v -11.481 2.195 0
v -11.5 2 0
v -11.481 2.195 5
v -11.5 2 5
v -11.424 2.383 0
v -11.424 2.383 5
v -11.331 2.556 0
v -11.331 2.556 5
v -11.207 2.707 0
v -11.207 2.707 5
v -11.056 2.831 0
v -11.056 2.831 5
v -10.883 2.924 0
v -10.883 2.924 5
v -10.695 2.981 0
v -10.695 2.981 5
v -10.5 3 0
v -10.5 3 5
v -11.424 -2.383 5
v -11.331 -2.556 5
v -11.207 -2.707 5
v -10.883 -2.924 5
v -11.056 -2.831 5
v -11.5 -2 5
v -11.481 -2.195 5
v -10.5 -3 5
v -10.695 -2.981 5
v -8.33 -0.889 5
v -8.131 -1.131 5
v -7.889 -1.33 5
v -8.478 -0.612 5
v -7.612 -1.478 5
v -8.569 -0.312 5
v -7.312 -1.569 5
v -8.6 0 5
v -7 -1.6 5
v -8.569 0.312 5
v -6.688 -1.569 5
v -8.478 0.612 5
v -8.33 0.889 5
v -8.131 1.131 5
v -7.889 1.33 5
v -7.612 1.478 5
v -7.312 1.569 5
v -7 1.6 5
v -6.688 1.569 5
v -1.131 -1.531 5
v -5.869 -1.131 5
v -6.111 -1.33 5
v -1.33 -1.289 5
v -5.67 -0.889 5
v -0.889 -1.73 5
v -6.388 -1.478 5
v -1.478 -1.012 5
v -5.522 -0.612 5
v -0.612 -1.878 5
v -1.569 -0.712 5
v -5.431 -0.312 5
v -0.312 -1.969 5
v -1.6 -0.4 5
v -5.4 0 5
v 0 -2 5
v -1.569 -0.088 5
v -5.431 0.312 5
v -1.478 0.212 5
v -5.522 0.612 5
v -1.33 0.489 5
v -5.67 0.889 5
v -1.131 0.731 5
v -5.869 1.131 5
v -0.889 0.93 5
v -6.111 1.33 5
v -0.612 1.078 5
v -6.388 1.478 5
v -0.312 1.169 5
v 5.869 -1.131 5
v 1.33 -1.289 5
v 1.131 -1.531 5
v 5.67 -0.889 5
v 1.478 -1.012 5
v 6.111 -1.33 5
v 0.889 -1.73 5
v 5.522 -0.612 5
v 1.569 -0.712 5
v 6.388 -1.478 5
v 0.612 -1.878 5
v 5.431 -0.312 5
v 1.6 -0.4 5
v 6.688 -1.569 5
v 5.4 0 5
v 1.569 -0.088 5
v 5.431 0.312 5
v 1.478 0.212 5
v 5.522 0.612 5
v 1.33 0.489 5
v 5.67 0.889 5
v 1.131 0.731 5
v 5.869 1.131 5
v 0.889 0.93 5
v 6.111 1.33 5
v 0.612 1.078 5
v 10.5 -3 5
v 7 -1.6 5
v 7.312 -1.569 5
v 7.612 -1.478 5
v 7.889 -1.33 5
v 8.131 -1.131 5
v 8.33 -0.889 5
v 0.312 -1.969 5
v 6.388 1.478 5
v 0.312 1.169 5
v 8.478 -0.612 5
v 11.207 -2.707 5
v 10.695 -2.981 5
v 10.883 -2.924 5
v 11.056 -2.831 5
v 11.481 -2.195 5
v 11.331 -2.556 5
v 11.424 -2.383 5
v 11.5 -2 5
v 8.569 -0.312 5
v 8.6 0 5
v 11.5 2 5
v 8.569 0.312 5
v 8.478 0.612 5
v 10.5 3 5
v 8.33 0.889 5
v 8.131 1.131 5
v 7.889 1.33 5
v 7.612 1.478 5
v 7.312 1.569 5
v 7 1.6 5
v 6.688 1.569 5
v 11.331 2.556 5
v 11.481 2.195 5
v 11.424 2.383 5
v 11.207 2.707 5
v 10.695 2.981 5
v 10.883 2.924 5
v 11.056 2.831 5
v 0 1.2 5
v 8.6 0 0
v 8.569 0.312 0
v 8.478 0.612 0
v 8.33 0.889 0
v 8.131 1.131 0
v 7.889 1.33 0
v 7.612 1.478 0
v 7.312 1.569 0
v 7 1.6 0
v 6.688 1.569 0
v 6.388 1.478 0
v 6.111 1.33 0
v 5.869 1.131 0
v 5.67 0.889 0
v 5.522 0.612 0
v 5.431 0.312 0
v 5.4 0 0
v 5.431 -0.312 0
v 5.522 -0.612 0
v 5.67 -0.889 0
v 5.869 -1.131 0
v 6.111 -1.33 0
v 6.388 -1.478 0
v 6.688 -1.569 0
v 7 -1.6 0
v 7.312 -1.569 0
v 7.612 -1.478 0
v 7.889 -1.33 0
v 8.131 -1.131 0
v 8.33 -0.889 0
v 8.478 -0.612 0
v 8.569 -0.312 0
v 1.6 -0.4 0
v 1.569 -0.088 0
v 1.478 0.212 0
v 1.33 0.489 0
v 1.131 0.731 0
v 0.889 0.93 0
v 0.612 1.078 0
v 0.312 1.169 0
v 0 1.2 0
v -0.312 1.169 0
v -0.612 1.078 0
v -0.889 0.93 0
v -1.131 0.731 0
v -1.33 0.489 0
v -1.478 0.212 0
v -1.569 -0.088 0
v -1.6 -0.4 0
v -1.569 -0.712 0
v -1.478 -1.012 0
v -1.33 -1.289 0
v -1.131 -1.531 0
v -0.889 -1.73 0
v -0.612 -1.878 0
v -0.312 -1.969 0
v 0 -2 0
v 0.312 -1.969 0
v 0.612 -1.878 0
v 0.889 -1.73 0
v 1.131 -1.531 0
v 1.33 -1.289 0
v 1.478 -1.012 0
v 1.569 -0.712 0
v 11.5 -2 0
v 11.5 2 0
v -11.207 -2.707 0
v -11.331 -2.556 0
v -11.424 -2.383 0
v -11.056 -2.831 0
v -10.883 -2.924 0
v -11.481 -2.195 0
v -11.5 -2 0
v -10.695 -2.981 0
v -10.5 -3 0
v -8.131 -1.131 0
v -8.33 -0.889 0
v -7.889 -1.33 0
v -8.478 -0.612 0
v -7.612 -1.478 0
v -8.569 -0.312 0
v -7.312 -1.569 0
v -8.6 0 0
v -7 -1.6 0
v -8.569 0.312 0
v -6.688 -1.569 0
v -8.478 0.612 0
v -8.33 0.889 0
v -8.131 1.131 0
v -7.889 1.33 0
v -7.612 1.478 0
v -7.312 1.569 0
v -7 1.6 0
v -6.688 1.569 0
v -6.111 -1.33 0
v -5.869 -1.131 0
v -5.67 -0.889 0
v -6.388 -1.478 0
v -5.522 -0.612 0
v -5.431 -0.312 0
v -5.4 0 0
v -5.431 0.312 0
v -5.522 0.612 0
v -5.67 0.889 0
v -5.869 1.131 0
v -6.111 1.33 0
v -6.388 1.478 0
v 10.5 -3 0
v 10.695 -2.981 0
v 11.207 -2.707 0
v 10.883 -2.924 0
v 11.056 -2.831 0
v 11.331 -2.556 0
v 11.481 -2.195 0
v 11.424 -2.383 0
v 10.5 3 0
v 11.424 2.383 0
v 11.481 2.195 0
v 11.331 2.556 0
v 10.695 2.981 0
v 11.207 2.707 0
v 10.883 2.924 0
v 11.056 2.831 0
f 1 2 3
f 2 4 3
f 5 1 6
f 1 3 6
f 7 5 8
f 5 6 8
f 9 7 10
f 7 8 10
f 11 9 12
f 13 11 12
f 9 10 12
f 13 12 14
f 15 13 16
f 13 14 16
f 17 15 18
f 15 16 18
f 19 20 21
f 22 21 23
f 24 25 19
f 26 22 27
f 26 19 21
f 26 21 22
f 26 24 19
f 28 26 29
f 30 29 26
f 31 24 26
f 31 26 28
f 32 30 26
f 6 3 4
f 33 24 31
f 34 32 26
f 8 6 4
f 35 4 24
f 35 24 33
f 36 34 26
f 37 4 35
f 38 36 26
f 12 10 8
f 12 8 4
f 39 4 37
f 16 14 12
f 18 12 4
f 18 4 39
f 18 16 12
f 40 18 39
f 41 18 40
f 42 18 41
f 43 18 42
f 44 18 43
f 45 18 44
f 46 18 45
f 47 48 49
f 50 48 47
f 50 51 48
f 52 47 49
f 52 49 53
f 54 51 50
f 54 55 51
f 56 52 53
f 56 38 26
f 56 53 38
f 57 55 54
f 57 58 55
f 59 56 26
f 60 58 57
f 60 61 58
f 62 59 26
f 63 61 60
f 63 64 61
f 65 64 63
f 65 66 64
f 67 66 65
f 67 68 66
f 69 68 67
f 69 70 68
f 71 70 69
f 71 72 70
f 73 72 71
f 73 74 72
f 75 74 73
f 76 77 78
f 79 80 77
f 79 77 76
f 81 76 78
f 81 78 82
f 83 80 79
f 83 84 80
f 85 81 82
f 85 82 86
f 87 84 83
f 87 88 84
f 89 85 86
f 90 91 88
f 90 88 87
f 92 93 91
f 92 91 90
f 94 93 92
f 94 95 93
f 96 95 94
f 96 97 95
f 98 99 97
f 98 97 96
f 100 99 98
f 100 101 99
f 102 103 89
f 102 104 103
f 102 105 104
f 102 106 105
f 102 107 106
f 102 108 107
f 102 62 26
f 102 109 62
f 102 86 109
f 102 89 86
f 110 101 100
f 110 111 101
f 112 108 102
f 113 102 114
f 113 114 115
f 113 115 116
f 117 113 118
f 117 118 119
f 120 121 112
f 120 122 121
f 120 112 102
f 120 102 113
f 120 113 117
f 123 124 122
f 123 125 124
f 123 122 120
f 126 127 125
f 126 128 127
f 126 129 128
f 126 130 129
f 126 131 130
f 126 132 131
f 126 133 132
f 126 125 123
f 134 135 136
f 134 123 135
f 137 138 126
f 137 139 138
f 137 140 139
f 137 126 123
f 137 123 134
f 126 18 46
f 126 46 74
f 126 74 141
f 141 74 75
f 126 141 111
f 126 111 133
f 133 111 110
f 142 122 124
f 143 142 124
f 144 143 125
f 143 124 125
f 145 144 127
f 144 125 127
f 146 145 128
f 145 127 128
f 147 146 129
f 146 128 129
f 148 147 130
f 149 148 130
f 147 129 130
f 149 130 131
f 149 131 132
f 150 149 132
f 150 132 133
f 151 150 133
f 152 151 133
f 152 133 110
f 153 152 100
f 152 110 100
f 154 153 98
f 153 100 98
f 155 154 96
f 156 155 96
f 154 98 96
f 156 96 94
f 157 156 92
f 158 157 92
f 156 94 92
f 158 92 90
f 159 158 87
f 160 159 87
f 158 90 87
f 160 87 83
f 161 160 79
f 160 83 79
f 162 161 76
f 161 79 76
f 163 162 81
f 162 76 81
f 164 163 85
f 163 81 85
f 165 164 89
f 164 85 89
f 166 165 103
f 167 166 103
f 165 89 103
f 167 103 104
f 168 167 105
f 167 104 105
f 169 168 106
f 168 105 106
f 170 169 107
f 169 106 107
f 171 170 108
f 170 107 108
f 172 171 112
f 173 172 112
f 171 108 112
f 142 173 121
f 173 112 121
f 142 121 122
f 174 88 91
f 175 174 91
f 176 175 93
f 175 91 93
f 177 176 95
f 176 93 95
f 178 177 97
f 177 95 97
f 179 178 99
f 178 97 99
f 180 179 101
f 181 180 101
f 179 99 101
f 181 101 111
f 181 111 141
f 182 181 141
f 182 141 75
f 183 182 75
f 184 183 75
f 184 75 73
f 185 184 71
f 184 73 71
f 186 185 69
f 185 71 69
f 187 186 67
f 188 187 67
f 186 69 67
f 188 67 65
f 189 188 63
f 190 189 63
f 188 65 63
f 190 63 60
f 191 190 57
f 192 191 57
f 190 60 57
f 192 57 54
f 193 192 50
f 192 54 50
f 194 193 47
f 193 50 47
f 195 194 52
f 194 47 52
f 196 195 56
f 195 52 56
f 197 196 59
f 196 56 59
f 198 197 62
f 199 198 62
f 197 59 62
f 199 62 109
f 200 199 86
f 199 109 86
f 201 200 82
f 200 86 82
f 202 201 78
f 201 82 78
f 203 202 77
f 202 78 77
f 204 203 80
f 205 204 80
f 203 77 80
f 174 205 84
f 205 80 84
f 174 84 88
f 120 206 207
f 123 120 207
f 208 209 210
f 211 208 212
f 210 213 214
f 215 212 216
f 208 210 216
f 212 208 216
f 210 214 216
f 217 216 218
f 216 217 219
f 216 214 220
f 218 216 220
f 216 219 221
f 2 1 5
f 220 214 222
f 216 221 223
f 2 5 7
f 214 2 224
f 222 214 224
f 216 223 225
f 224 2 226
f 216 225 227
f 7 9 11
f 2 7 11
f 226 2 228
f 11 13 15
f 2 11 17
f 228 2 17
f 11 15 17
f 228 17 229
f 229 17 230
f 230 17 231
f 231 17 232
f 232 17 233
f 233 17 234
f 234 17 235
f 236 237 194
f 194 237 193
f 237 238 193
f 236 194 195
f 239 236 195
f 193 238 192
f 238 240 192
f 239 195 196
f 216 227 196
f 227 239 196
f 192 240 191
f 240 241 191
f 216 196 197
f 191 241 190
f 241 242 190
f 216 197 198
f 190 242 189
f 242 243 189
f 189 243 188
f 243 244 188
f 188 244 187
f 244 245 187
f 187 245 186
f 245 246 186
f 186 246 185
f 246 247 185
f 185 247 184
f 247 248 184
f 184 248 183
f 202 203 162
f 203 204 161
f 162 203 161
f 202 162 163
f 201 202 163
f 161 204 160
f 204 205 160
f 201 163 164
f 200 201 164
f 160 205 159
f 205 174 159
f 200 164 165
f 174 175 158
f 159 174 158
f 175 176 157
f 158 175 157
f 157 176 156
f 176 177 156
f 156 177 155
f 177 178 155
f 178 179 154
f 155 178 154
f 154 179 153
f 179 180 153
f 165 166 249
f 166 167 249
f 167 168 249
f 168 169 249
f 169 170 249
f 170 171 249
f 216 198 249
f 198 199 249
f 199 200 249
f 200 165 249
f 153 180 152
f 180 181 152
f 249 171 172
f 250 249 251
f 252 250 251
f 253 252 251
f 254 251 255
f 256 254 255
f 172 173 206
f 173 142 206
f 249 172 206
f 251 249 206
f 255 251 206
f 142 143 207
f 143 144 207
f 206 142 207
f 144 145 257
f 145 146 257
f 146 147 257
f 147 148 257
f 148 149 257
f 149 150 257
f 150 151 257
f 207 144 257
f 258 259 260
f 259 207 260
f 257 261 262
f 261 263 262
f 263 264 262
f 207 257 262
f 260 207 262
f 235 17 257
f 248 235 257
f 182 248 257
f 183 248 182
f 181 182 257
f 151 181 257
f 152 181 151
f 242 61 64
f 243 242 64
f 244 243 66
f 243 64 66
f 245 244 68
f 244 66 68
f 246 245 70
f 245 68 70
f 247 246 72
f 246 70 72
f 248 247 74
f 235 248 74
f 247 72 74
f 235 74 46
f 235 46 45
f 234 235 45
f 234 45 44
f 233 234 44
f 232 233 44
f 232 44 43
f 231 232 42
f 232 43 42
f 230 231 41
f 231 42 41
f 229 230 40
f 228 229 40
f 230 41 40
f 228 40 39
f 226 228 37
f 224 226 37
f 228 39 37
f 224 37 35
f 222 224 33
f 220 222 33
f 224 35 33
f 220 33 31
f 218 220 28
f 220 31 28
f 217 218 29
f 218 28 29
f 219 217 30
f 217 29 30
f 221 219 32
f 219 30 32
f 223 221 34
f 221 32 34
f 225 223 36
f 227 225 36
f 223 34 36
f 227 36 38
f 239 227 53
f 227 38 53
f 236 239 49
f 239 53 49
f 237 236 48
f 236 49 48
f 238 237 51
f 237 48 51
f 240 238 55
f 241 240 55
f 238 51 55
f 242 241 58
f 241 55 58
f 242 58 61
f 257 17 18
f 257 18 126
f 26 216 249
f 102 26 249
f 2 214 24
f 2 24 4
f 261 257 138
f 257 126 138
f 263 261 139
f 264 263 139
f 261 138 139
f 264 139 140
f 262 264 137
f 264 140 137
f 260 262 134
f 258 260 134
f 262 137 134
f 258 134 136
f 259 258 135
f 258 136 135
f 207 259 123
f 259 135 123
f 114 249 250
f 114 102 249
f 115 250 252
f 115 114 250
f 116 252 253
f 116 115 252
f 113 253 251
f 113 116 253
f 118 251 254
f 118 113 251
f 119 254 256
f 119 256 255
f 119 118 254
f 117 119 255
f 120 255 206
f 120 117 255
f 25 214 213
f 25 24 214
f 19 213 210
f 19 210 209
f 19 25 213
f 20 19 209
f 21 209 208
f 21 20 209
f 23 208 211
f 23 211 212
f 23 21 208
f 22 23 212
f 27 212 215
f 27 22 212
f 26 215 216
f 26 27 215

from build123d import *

# Parameters (mm, degrees)
SKETCH_1_W          = 23
SKETCH_1_H          = 6
EXTRUDE_1_DEPTH     = 5
SKETCH_2_R          = 1.6
CUT_EXTRUDE_1_DEPTH = 5
FILLET_1_R          = 1


with BuildPart() as part:
    # 草图1 → 凸台-拉伸1 (new body)
    with BuildSketch(Plane.XY):
        Rectangle(SKETCH_1_W, SKETCH_1_H)
    extrude(amount=EXTRUDE_1_DEPTH)

    # 草图2 → 切除-拉伸1 (cut)
    with BuildSketch(Plane.XY.offset(5)):
        with Locations((-7, 0)):
            Circle(SKETCH_2_R)
        with Locations((7, 0)):
            Circle(SKETCH_2_R)
        with Locations((0, -0.4)):
            Circle(SKETCH_2_R)
    extrude(amount=-CUT_EXTRUDE_1_DEPTH, mode=Mode.SUBTRACT)

    # 圆角1
    fillet_1_edges = [part.edges().sort_by_distance(p)[0] for p in [
        (11.5, -3, 2.5),
        (-11.5, -3, 2.5),
        (-11.5, 3, 2.5),
        (11.5, 3, 2.5),
    ]]
    fillet(fillet_1_edges, radius=FILLET_1_R)


solid = part.part
